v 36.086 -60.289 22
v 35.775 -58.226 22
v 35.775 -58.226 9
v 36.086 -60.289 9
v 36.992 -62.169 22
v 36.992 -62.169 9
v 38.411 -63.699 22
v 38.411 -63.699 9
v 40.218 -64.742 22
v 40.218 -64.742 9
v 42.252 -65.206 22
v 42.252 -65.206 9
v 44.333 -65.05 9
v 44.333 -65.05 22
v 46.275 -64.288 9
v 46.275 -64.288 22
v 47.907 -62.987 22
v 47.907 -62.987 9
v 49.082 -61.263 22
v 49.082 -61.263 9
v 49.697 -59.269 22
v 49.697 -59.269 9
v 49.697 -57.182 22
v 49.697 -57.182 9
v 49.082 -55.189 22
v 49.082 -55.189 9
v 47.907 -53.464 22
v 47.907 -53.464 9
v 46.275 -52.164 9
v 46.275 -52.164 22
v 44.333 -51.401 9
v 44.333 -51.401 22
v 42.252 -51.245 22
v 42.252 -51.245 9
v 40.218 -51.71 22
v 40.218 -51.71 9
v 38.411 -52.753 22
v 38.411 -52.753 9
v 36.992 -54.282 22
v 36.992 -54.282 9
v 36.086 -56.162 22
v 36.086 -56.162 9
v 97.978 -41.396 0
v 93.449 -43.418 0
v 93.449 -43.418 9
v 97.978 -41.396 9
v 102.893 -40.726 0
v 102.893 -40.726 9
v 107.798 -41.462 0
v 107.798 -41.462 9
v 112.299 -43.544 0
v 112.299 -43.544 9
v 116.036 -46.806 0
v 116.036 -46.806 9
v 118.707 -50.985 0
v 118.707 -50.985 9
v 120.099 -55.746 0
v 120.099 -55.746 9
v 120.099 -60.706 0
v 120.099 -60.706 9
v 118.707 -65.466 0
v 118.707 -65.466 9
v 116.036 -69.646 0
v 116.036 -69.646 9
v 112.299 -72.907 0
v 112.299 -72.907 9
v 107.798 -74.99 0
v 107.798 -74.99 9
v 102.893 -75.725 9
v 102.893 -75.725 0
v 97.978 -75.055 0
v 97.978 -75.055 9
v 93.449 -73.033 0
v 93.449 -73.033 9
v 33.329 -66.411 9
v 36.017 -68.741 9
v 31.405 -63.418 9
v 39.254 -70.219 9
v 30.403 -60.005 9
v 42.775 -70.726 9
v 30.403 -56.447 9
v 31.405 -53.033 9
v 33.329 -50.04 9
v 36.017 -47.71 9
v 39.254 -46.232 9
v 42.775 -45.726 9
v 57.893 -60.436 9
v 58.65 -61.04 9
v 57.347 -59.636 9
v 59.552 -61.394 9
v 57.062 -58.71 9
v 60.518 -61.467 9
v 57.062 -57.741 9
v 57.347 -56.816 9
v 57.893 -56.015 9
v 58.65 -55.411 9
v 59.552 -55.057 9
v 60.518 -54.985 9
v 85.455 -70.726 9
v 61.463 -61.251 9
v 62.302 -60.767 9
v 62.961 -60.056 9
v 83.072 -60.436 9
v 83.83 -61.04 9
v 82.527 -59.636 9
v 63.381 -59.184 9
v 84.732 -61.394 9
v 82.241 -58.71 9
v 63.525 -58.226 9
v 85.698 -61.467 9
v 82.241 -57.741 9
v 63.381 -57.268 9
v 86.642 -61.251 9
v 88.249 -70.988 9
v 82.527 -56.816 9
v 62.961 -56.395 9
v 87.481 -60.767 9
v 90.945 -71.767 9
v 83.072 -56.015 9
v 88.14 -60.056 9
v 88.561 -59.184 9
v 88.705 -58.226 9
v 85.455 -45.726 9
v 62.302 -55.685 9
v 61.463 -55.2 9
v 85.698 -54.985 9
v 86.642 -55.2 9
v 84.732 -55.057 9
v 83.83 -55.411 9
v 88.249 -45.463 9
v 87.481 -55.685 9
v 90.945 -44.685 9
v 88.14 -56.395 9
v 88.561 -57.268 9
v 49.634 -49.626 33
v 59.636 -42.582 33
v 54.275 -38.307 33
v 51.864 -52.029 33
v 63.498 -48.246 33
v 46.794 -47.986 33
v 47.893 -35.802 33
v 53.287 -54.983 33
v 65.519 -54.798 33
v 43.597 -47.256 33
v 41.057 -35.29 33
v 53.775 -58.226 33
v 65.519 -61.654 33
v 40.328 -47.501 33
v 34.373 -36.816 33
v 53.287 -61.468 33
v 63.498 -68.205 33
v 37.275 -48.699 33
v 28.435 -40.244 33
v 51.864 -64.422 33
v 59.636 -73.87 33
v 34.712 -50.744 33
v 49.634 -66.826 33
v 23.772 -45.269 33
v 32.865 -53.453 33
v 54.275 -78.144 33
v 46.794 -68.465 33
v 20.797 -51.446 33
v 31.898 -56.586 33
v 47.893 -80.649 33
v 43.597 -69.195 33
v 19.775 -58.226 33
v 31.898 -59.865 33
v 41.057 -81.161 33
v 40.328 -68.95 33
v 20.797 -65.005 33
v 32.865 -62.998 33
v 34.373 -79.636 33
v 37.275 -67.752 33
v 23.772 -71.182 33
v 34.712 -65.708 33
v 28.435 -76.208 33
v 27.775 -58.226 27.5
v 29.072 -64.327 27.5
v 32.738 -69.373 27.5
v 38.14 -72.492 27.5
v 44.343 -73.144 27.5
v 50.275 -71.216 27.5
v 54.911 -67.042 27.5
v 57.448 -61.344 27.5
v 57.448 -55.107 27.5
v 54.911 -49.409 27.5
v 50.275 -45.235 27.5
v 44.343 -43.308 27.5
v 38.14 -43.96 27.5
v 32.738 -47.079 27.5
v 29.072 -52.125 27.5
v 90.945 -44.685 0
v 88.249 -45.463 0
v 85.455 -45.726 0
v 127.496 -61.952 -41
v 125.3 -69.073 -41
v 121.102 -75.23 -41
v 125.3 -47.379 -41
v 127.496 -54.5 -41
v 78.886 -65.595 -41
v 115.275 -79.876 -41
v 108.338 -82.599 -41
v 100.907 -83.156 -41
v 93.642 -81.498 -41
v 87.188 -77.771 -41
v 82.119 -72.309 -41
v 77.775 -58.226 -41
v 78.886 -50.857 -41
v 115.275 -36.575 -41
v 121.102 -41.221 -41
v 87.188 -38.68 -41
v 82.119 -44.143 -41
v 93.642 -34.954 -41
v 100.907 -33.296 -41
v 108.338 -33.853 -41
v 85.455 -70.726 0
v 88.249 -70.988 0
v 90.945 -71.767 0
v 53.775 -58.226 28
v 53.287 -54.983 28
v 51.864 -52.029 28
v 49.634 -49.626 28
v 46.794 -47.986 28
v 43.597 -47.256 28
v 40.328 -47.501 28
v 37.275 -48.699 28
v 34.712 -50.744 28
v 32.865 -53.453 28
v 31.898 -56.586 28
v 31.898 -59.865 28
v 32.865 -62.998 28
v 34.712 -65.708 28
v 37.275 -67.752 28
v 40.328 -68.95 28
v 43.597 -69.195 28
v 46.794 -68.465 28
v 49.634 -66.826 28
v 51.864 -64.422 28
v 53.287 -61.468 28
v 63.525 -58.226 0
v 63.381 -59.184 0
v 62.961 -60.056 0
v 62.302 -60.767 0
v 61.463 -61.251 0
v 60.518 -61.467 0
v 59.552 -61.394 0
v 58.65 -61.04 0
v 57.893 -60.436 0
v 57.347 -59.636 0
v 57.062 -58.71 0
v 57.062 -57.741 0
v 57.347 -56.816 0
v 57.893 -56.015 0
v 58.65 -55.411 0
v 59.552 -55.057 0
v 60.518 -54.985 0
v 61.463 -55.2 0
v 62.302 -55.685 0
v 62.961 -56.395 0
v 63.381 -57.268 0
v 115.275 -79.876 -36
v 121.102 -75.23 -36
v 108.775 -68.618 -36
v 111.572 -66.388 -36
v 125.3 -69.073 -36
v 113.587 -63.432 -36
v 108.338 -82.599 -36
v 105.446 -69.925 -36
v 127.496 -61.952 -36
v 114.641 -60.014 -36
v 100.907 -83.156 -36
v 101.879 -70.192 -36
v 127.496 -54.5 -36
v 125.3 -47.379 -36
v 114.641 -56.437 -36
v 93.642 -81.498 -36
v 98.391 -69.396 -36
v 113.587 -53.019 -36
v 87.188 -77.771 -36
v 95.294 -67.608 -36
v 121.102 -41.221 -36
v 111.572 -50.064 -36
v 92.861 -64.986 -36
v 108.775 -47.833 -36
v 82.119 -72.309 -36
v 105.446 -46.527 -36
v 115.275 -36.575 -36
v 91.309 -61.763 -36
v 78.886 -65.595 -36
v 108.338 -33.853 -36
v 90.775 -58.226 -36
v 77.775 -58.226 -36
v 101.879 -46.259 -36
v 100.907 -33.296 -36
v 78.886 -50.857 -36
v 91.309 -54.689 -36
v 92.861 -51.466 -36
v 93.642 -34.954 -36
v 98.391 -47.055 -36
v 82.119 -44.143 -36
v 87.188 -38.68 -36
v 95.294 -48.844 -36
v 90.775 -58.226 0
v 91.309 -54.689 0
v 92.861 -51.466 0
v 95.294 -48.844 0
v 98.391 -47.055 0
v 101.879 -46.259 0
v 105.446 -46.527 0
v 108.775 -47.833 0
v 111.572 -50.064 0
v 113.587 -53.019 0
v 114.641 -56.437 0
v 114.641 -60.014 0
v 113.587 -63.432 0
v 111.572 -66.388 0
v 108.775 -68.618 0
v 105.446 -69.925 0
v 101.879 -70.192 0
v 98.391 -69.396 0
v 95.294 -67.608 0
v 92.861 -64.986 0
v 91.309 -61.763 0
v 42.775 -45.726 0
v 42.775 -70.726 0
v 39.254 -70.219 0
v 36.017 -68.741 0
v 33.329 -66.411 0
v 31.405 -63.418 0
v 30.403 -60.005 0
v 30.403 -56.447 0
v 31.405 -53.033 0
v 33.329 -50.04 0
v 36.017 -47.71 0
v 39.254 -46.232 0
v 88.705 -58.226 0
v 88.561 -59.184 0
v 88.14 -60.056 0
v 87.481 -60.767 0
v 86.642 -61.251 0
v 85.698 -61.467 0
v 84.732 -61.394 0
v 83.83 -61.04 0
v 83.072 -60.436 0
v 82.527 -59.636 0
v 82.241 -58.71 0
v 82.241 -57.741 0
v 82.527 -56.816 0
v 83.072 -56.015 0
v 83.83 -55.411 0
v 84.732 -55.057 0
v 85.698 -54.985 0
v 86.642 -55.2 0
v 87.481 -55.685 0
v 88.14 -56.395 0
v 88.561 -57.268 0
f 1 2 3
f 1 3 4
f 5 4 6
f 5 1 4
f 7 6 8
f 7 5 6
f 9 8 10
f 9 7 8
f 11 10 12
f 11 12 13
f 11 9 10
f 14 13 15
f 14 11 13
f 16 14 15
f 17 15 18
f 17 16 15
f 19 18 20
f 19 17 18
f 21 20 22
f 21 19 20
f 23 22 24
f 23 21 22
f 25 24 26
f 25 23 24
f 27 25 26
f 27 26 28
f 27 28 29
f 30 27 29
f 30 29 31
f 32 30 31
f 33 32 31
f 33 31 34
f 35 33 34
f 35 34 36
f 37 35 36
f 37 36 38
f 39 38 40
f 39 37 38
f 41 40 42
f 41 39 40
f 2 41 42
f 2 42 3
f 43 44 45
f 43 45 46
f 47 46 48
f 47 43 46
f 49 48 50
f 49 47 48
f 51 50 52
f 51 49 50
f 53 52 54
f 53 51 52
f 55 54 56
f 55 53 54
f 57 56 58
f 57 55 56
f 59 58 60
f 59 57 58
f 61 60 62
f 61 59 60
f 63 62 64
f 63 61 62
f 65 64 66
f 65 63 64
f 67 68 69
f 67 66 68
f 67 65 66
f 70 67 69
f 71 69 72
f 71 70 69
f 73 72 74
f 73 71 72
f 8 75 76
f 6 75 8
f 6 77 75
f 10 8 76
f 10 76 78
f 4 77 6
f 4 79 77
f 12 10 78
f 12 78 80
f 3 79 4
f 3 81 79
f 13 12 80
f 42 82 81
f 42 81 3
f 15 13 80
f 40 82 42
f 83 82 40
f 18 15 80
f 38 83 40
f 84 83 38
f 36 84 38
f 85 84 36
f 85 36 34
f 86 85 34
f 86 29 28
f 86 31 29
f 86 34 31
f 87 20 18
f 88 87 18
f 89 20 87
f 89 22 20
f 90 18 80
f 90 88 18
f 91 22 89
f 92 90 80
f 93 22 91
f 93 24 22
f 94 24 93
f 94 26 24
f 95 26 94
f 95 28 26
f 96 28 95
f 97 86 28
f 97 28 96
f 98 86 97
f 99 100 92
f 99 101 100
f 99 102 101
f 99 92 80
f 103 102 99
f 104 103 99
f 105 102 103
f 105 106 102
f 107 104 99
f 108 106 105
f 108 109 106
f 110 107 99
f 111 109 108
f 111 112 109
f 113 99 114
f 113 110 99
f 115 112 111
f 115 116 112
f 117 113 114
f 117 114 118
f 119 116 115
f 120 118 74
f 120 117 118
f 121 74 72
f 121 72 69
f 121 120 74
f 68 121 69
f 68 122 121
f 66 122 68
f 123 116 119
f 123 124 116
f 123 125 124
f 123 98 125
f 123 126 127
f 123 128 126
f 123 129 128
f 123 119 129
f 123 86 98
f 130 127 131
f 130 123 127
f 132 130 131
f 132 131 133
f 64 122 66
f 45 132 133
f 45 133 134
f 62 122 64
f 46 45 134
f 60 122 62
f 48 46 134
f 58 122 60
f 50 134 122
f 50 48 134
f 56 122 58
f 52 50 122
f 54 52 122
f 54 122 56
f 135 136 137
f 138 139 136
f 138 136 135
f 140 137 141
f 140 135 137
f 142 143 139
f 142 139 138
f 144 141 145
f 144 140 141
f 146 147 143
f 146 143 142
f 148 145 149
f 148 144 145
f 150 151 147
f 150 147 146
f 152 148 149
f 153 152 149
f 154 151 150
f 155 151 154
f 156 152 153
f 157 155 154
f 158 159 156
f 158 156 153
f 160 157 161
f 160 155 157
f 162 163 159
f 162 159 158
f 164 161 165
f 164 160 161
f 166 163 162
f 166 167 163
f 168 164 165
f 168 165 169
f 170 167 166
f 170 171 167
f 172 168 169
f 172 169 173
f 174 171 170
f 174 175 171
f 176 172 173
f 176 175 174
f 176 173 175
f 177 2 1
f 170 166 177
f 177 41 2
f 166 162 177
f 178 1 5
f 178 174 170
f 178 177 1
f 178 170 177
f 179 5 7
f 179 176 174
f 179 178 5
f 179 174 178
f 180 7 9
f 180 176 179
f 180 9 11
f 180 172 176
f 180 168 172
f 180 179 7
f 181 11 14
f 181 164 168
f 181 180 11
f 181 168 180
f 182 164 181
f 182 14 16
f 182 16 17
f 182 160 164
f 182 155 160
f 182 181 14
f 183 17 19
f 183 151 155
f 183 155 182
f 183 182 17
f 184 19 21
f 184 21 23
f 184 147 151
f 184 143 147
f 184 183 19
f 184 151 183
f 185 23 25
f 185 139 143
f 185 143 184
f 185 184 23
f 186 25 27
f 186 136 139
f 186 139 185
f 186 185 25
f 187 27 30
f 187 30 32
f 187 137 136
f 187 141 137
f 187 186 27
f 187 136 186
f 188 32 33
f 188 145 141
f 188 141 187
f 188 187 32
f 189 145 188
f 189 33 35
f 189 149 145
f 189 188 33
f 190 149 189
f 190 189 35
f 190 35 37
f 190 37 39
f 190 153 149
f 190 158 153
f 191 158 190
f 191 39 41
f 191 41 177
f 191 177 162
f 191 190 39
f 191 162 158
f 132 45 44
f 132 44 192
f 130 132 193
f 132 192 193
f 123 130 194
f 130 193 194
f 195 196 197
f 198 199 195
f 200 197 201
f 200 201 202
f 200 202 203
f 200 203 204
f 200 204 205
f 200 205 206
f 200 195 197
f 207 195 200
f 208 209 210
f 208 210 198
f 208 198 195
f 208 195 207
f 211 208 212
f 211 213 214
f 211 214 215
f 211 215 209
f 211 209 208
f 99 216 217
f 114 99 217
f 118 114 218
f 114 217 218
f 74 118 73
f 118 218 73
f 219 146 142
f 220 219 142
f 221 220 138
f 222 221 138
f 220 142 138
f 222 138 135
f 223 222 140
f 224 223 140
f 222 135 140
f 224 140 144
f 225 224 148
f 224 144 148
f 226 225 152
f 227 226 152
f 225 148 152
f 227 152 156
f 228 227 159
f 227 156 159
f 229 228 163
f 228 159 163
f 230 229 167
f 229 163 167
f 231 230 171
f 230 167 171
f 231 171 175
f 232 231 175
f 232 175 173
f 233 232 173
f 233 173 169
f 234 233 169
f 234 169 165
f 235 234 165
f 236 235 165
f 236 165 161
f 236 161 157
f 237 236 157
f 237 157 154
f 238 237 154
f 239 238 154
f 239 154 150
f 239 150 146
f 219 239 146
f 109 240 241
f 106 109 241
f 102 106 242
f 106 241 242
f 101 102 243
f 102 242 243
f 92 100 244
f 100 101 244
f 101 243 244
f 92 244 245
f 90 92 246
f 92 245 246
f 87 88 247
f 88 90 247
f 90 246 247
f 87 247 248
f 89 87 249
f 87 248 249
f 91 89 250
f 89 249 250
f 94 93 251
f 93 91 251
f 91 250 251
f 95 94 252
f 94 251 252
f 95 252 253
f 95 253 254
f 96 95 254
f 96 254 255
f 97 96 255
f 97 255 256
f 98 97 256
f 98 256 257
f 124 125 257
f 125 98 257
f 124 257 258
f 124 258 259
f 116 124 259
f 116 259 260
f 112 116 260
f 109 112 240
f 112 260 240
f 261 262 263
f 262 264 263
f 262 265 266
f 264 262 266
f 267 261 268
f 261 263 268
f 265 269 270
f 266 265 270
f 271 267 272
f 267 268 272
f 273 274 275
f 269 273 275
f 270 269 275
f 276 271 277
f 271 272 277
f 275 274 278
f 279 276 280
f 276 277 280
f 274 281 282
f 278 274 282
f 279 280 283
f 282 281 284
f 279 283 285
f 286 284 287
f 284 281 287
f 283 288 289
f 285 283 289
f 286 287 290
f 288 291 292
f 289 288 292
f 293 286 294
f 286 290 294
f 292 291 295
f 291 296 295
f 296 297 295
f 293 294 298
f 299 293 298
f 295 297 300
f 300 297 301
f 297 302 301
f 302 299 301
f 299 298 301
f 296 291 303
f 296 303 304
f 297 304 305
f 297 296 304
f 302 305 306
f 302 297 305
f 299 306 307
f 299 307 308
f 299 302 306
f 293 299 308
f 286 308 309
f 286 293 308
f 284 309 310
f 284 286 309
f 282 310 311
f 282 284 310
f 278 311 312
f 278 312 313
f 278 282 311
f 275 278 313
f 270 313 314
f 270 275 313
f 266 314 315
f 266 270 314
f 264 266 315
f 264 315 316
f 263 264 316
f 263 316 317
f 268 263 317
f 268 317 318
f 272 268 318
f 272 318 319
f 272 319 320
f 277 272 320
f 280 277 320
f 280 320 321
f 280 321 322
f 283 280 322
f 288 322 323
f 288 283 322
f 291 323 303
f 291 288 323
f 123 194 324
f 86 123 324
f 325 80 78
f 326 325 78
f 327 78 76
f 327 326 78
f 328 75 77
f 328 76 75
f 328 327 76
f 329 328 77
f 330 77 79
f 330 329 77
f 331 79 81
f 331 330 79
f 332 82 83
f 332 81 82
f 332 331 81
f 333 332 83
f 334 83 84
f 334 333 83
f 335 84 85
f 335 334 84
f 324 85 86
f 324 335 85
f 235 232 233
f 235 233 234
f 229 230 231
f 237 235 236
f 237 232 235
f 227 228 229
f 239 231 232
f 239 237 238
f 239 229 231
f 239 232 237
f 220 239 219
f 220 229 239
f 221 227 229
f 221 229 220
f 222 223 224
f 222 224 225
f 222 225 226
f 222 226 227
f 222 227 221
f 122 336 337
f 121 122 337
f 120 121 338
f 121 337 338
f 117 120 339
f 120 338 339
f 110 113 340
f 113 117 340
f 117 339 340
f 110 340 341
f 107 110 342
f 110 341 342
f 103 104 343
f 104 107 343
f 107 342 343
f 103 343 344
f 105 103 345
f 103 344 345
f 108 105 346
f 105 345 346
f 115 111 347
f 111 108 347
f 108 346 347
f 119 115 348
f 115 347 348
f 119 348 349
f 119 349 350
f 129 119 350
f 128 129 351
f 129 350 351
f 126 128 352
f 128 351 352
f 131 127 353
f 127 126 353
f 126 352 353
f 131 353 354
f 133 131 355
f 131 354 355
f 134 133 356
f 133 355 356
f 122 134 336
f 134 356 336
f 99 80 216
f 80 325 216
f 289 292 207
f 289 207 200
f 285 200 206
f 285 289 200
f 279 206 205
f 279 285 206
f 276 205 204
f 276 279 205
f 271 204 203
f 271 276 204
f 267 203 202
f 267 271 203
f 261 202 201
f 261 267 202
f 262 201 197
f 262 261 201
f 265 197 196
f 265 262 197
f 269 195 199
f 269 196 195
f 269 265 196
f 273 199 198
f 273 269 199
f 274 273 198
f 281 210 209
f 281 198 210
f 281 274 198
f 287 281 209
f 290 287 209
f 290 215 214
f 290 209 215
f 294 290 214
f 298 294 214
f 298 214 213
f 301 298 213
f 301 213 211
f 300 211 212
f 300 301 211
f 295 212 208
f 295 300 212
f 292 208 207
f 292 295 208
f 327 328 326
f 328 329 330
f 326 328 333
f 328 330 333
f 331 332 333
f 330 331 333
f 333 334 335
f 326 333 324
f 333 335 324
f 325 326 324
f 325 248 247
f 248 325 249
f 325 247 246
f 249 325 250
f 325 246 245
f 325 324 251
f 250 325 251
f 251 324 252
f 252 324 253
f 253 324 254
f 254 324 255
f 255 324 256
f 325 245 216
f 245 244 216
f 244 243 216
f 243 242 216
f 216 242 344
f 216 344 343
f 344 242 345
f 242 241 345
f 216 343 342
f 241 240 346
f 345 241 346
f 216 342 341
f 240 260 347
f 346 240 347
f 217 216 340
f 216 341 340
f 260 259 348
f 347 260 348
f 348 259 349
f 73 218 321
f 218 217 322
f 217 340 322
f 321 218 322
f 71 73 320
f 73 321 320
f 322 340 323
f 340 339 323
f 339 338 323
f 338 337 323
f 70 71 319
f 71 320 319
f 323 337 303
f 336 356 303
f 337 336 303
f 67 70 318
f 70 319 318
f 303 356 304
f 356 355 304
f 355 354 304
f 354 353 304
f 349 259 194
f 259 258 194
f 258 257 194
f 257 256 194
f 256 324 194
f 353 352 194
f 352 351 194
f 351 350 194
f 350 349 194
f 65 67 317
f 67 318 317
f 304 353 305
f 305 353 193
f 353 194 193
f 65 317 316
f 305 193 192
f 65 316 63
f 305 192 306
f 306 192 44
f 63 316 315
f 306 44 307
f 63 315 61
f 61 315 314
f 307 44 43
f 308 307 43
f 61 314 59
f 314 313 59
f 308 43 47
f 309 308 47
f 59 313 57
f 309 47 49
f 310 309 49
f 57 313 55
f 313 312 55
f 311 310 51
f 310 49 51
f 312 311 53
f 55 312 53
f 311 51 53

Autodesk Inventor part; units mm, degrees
sketch "Boceto1" plane through (0, 0, 0) normal (0, 0, 1) x (1, 0, 0)
  line L0 (85.4549, -45.7257) -> (42.7754, -45.7257)
  line L1 (42.7754, -70.7257) -> (85.4549, -70.7257)
  arc A0 (42.7754, -45.7257) -> (42.7754, -70.7257) centre (42.7754, -58.2257) ccw
  arc A1 (93.4489, -73.0334) -> (93.4489, -43.418) centre (102.7754, -58.2257) ccw
  arc A2 (85.4549, -45.7257) -> (93.4489, -43.418) centre (85.4549, -30.7257) ccw
  arc A3 (93.4489, -73.0334) -> (85.4549, -70.7257) centre (85.4549, -85.7257) ccw
  circle A4 centre (102.7754, -58.2257) radius 8.1
  circle A5 centre (60.2754, -58.2257) radius 3.25
  circle A6 centre (85.4549, -58.2257) radius 3.25
  line L2 (-16.3205, 1) -> (-59, 1)
  line L3 (-59, -24) -> (-16.3205, -24)
  arc A7 (-59, 1) -> (-59, -24) centre (-59, -11.5) ccw
  line L4 (-59, -21.6036) -> (-67.75, -16.5518)
  line L5 (-67.75, -16.5518) -> (-67.75, -6.4482)
  line L6 (-67.75, -6.4482) -> (-59, -1.3964)
  line L7 (-59, -1.3964) -> (-50.25, -6.4482)
  line L8 (-50.25, -6.4482) -> (-50.25, -16.5518)
  line L9 (-50.25, -16.5518) -> (-59, -21.6036)
  arc A8 (-8.3264, -26.3077) -> (-8.3264, 3.3077) centre (1, -11.5) ccw
  arc A9 (-16.3205, 1) -> (-8.3264, 3.3077) centre (-16.3205, 16) ccw
  arc A10 (-8.3264, -26.3077) -> (-16.3205, -24) centre (-16.3205, -39) ccw
  circle A11 centre (1, -11.5) radius 8.1
  circle A12 centre (-41.5, -11.5) radius 3.25
  circle A13 centre (-16.3205, -11.5) radius 3.25
  line L10 (85.6004, 1.2855) -> (42.9209, 1.2855)
  line L11 (42.9209, -23.7145) -> (85.6004, -23.7145)
  arc A14 (42.9209, 1.2855) -> (42.9209, -23.7145) centre (42.9209, -11.2145) ccw
  line L12 (42.9209, -21.3181) -> (34.1709, -16.2663)
  line L13 (34.1709, -16.2663) -> (34.1709, -6.1627)
  line L14 (34.1709, -6.1627) -> (42.9209, -1.1109)
  line L15 (42.9209, -1.1109) -> (51.6709, -6.1627)
  line L16 (51.6709, -6.1627) -> (51.6709, -16.2663)
  line L17 (51.6709, -16.2663) -> (42.9209, -21.3181)
  arc A15 (93.5944, -26.0222) -> (93.5944, 3.5932) centre (102.9209, -11.2145) ccw
  arc A16 (85.6004, 1.2855) -> (93.5944, 3.5932) centre (85.6004, 16.2855) ccw
  arc A17 (93.5944, -26.0222) -> (85.6004, -23.7145) centre (85.6004, -38.7145) ccw
  circle A18 centre (102.9209, -11.2145) radius 8.1
  circle A19 centre (60.4209, -11.2145) radius 3.25
  circle A20 centre (85.6004, -11.2145) radius 3.25
  circle A21 centre (42.7754, -58.2257) radius 7
  line L18 (-15.6185, -45.6026) -> (-58.298, -45.6026)
  line L19 (-58.298, -70.6026) -> (-15.6185, -70.6026)
  arc A22 (-58.298, -45.6026) -> (-58.298, -70.6026) centre (-58.298, -58.1026) ccw
  arc A23 (-7.6244, -72.9103) -> (-7.6244, -43.2949) centre (1.702, -58.1026) ccw
  arc A24 (-15.6185, -45.6026) -> (-7.6244, -43.2949) centre (-15.6185, -30.6026) ccw
  arc A25 (-7.6244, -72.9103) -> (-15.6185, -70.6026) centre (-15.6185, -85.6026) ccw
  circle A26 centre (1.702, -58.1026) radius 8.1
  circle A27 centre (-40.798, -58.1026) radius 3.25
  circle A28 centre (-15.6185, -58.1026) radius 3.25
  circle A29 centre (-58.298, -58.1026) radius 7
  point P0 (90.5279, -45.7257)
  point P1 (90.5279, -70.7257)
  point P2 (-11.2474, 1)
  point P3 (-11.2474, -24)
  point P4 (90.6734, 1.2855)
  point P5 (90.6734, -23.7145)
  point P6 (-10.5454, -45.6026)
  point P7 (-10.5454, -70.6026)
extrude "Extrusión1" add sketch "Boceto1" along normal blind 9 contours A2 A1 A3 L1 A0 L0
sketch "Boceto2" plane through (0, 0, 0) normal (0, 0, -1) x (-1, 0, 0)
  circle A0 centre (-102.7754, -58.2257) radius 8.1 projected
  circle A1 centre (-102.7754, -58.2257) radius 12
  point P0 (0, 0)
  dimension "d13" = 24
extrude "Extrusión2" add sketch "Boceto2" along normal blind 36 and the other way blind 9 contours A0 | A1
sketch "Boceto3" plane through (102.7754, -58.2257, -36) normal (0, 0, -1) x (-1, 0, 0)
  circle A0 centre (0, 0) radius 25
  point P0 (102.7754, 58.2257)
  dimension "d16" = 50
extrude "Extrusión3" add sketch "Boceto3" along normal blind 5
ref_plane "Plano de trabajo1" through (42.7754, -58.2257, 0) normal (0, -1, 0) x (1, 0, 0)
sketch "Boceto7" plane through (42.7754, -58.2257, 0) normal (0, -1, 0) x (1, 0, 0)
  line L0 (-7, 0) -> (7, 0) projected
  line L1 (7, 9) -> (7, 0) projected
  line L2 (-7, 0) -> (7, 0)
  line L3 (7, 0) -> (7, 9)
  line L4 (-7, 9) -> (-7, 0)
  line L5 (-7, 9) -> (-7, 22)
  line L6 (7, 22) -> (7, 9)
  line L7 (23, 33) -> (-23, 33)
  line L8 (7, 22) -> (23, 33)
  line L9 (-7, 22) -> (-23, 33)
  line L10 (0, -1.9215) -> (0, 41.7304)
  point P0 (-42.7754, 0)
  point P1 (0, 9)
  point P2 (0, 0)
  point P3 (0, 33)
  dimension "d23" = 14
  dimension "d24" = 13
  dimension "d38" = 46
  dimension "d39" = 11
revolve "Revolución1" add sketch "Boceto7" angle 360 about axis through (42.7754, -58.2257, -1.9215) along (0, 0, 1) contours L4 L5 L9 L7 L10 L0
sketch "Boceto8" plane through (42.7754, -58.2257, 33) normal (0, 0, 1) x (1, 0, 0)
  circle A0 centre (0, 0) radius 11
  point P0 (-42.7754, 58.2257)
  dimension "d29" = 22
extrude "Extrusión5" cut sketch "Boceto8" against normal blind 5
properties part number "Herramienta1"
